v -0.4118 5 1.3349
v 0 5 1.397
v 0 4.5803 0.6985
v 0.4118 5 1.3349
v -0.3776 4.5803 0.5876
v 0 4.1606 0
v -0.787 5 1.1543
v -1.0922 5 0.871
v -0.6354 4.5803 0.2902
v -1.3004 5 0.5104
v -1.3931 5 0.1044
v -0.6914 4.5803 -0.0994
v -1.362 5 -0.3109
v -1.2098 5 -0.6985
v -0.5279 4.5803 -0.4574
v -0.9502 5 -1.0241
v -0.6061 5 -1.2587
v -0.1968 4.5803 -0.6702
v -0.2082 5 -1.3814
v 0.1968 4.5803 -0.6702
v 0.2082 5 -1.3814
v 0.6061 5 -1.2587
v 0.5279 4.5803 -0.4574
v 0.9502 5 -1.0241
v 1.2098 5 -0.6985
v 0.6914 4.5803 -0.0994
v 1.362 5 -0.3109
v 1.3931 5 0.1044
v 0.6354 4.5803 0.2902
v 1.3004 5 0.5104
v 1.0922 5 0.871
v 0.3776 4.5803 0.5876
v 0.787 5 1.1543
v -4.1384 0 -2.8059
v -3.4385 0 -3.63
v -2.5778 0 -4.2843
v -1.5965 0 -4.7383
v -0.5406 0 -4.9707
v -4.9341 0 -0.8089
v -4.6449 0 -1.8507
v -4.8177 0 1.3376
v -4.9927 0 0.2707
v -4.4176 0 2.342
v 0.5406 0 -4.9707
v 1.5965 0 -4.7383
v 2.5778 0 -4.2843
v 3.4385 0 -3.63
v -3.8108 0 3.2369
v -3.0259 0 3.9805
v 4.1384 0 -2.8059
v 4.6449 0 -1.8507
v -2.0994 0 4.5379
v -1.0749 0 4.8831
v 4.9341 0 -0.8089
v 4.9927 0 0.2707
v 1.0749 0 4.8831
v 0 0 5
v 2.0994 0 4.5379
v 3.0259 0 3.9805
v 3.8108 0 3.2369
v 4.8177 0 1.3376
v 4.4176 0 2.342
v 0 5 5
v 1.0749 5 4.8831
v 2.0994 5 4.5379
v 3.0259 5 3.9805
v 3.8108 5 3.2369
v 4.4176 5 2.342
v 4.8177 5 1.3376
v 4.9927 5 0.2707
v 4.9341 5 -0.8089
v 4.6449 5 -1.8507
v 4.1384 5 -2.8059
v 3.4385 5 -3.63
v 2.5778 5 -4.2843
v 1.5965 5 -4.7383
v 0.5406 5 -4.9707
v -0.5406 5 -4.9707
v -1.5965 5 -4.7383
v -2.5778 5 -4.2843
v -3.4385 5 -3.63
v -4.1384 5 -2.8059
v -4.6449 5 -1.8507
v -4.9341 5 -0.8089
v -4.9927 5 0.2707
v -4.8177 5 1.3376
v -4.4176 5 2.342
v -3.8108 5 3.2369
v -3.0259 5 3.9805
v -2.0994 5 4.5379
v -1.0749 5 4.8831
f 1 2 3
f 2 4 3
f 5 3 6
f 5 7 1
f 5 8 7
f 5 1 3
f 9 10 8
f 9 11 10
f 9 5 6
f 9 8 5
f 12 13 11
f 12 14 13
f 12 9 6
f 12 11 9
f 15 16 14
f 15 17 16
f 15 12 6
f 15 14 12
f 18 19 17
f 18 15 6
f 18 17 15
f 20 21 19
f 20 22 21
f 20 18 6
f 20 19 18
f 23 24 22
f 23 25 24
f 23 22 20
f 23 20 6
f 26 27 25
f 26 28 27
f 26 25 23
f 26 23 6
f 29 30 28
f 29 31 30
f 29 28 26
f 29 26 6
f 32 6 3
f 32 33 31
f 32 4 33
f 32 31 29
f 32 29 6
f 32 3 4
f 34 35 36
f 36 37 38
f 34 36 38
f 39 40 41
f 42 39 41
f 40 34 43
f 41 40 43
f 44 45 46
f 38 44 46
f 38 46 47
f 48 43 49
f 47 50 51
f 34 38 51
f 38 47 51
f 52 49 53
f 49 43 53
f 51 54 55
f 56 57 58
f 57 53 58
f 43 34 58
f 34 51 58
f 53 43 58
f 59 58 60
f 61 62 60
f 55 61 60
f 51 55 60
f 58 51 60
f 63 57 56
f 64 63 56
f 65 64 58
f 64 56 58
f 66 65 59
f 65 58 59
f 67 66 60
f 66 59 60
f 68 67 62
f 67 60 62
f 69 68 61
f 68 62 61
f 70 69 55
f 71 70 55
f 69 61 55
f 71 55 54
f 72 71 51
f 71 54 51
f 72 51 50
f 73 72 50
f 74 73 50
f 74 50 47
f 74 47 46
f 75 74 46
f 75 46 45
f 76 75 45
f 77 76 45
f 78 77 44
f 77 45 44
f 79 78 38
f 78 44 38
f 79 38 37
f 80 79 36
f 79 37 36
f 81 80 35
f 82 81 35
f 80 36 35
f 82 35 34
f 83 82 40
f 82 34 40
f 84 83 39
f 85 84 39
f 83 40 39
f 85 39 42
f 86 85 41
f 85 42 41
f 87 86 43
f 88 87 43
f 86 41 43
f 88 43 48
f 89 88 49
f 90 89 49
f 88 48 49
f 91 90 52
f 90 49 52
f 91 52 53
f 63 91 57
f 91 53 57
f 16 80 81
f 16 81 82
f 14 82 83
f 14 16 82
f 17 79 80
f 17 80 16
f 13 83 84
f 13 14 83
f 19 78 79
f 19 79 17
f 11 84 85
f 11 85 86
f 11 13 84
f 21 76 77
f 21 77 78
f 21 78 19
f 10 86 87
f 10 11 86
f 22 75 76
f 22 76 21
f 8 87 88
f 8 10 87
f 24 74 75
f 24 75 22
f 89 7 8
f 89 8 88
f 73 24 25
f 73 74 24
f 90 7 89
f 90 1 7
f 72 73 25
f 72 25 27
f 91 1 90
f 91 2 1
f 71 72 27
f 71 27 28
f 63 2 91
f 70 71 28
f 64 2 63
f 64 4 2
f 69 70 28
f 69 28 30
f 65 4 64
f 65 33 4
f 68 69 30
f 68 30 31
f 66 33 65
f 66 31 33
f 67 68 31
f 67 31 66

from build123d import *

# Parameters (mm, degrees)
ESQUISSE1_R                                  = 5
BOSS_EXTRU_1_DEPTH                           = 5
CHAMBRAGE_POUR_VIS_T_TE_RONDE_BOMB_E_A_COUNT = 2
CHAMBRAGE_POUR_VIS_T_TE_RONDE_BOMB_E_A_PITCH = 152
CHAMBRAGE_POUR_VIS_T_TE_RONDE_BOMB_2_COUNT   = 2
CHAMBRAGE_POUR_VIS_T_TE_RONDE_BOMB_2_PITCH   = 111
CHAMBRAGE_POUR_VIS_T_TE_RONDE_BOMB_3_COUNT   = 2
CHAMBRAGE_POUR_VIS_T_TE_RONDE_BOMB_3_PITCH   = 188.215302247
CHAMBRAGE_POUR_VIS_T_TE_RONDE_BOMB_4_A_COUNT = 2
CHAMBRAGE_POUR_VIS_T_TE_RONDE_BOMB_4_A_PITCH = 152
CHAMBRAGE_POUR_VIS_T_TE_RONDE_BOMB_5_COUNT   = 2
CHAMBRAGE_POUR_VIS_T_TE_RONDE_BOMB_5_PITCH   = 111
CHAMBRAGE_POUR_VIS_T_TE_RONDE_BOMB_6_COUNT   = 2
CHAMBRAGE_POUR_VIS_T_TE_RONDE_BOMB_6_PITCH   = 188.215302247


with BuildPart() as part:
    # Esquisse1 → Boss.-Extru.1 (new body)
    with BuildSketch(Plane(origin=(0, 0, 0), x_dir=(1, 0, 0), z_dir=(0, 1, 0))):
        with Locations(Location((0, 0, 0), (0, 0, 270))):
            Circle(ESQUISSE1_R)
    extrude(amount=BOSS_EXTRU_1_DEPTH)

    # Esquisse3 → Chambrage pour vis _ t_te ronde bomb_e (revolve, cut)
    with BuildSketch(Plane(origin=(0, 11, -152), x_dir=(0, 0, 1), z_dir=(1, 0, 0))):
        Polygon((0, 0), (0, 6.839402285), (1.397, 6), (1.397, 1.8034), (2.77876, 1.8034), (2.77876, 0.635), (3.41376, 0), align=None)
    chambrage_pour_vis_t_te_ronde_bomb_e = revolve(axis=Axis((0, 17.35, -152), (0, -1, 0)), mode=Mode.SUBTRACT)

    # Chambrage pour vis _ t_te ronde bomb_e a: Chambrage pour vis _ t_te ronde bomb_e ×2
    with Locations(*[(0, 0, i * CHAMBRAGE_POUR_VIS_T_TE_RONDE_BOMB_E_A_PITCH) for i in range(1, CHAMBRAGE_POUR_VIS_T_TE_RONDE_BOMB_E_A_COUNT)]):
        add(chambrage_pour_vis_t_te_ronde_bomb_e, mode=Mode.SUBTRACT)

    # Chambrage pour vis _ t_te ronde bomb 2: Chambrage pour vis _ t_te ronde bomb_e ×2
    with Locations(*[(i * CHAMBRAGE_POUR_VIS_T_TE_RONDE_BOMB_2_PITCH, 0, 0) for i in range(1, CHAMBRAGE_POUR_VIS_T_TE_RONDE_BOMB_2_COUNT)]):
        add(chambrage_pour_vis_t_te_ronde_bomb_e, mode=Mode.SUBTRACT)

    # Chambrage pour vis _ t_te ronde bomb 3: Chambrage pour vis _ t_te ronde bomb_e ×2
    with Locations(*[Vector(0.5897501354816591, 0, 0.8075857711100195) * (i * CHAMBRAGE_POUR_VIS_T_TE_RONDE_BOMB_3_PITCH) for i in range(1, CHAMBRAGE_POUR_VIS_T_TE_RONDE_BOMB_3_COUNT)]):
        add(chambrage_pour_vis_t_te_ronde_bomb_e, mode=Mode.SUBTRACT)

    # Esquisse5 → Chambrage pour vis _ t_te ronde bomb 4 (revolve, cut)
    with BuildSketch(Plane(origin=(0, 11, 0), x_dir=(0, 0, 1), z_dir=(1, 0, 0))):
        Polygon((0, 0), (0, 6.839402285), (1.397, 6), (1.397, 1.8034), (2.77876, 1.8034), (2.77876, 0.635), (3.41376, 0), align=None)
    chambrage_pour_vis_t_te_ronde_bomb_4 = revolve(axis=Axis((0, 17.35, 0), (0, -1, 0)), mode=Mode.SUBTRACT)

    # Chambrage pour vis _ t_te ronde bomb 4 a: Chambrage pour vis _ t_te ronde bomb 4 ×2
    with Locations(*[Vector(-0.4987370820513642, 0, -0.8667533230319286) * (i * CHAMBRAGE_POUR_VIS_T_TE_RONDE_BOMB_4_A_PITCH) for i in range(1, CHAMBRAGE_POUR_VIS_T_TE_RONDE_BOMB_4_A_COUNT)]):
        add(chambrage_pour_vis_t_te_ronde_bomb_4, mode=Mode.SUBTRACT)

    # Chambrage pour vis _ t_te ronde bomb 5: Chambrage pour vis _ t_te ronde bomb 4 ×2
    with Locations(*[Vector(-0.8667533230319285, 0, 0.4987370820513645) * (i * CHAMBRAGE_POUR_VIS_T_TE_RONDE_BOMB_5_PITCH) for i in range(1, CHAMBRAGE_POUR_VIS_T_TE_RONDE_BOMB_5_COUNT)]):
        add(chambrage_pour_vis_t_te_ronde_bomb_4, mode=Mode.SUBTRACT)

    # Chambrage pour vis _ t_te ronde bomb 6: Chambrage pour vis _ t_te ronde bomb 4 ×2
    with Locations(*[Vector(-0.9139408606768702, 0, -0.40584738903339235) * (i * CHAMBRAGE_POUR_VIS_T_TE_RONDE_BOMB_6_PITCH) for i in range(1, CHAMBRAGE_POUR_VIS_T_TE_RONDE_BOMB_6_COUNT)]):
        add(chambrage_pour_vis_t_te_ronde_bomb_4, mode=Mode.SUBTRACT)


solid = part.part
